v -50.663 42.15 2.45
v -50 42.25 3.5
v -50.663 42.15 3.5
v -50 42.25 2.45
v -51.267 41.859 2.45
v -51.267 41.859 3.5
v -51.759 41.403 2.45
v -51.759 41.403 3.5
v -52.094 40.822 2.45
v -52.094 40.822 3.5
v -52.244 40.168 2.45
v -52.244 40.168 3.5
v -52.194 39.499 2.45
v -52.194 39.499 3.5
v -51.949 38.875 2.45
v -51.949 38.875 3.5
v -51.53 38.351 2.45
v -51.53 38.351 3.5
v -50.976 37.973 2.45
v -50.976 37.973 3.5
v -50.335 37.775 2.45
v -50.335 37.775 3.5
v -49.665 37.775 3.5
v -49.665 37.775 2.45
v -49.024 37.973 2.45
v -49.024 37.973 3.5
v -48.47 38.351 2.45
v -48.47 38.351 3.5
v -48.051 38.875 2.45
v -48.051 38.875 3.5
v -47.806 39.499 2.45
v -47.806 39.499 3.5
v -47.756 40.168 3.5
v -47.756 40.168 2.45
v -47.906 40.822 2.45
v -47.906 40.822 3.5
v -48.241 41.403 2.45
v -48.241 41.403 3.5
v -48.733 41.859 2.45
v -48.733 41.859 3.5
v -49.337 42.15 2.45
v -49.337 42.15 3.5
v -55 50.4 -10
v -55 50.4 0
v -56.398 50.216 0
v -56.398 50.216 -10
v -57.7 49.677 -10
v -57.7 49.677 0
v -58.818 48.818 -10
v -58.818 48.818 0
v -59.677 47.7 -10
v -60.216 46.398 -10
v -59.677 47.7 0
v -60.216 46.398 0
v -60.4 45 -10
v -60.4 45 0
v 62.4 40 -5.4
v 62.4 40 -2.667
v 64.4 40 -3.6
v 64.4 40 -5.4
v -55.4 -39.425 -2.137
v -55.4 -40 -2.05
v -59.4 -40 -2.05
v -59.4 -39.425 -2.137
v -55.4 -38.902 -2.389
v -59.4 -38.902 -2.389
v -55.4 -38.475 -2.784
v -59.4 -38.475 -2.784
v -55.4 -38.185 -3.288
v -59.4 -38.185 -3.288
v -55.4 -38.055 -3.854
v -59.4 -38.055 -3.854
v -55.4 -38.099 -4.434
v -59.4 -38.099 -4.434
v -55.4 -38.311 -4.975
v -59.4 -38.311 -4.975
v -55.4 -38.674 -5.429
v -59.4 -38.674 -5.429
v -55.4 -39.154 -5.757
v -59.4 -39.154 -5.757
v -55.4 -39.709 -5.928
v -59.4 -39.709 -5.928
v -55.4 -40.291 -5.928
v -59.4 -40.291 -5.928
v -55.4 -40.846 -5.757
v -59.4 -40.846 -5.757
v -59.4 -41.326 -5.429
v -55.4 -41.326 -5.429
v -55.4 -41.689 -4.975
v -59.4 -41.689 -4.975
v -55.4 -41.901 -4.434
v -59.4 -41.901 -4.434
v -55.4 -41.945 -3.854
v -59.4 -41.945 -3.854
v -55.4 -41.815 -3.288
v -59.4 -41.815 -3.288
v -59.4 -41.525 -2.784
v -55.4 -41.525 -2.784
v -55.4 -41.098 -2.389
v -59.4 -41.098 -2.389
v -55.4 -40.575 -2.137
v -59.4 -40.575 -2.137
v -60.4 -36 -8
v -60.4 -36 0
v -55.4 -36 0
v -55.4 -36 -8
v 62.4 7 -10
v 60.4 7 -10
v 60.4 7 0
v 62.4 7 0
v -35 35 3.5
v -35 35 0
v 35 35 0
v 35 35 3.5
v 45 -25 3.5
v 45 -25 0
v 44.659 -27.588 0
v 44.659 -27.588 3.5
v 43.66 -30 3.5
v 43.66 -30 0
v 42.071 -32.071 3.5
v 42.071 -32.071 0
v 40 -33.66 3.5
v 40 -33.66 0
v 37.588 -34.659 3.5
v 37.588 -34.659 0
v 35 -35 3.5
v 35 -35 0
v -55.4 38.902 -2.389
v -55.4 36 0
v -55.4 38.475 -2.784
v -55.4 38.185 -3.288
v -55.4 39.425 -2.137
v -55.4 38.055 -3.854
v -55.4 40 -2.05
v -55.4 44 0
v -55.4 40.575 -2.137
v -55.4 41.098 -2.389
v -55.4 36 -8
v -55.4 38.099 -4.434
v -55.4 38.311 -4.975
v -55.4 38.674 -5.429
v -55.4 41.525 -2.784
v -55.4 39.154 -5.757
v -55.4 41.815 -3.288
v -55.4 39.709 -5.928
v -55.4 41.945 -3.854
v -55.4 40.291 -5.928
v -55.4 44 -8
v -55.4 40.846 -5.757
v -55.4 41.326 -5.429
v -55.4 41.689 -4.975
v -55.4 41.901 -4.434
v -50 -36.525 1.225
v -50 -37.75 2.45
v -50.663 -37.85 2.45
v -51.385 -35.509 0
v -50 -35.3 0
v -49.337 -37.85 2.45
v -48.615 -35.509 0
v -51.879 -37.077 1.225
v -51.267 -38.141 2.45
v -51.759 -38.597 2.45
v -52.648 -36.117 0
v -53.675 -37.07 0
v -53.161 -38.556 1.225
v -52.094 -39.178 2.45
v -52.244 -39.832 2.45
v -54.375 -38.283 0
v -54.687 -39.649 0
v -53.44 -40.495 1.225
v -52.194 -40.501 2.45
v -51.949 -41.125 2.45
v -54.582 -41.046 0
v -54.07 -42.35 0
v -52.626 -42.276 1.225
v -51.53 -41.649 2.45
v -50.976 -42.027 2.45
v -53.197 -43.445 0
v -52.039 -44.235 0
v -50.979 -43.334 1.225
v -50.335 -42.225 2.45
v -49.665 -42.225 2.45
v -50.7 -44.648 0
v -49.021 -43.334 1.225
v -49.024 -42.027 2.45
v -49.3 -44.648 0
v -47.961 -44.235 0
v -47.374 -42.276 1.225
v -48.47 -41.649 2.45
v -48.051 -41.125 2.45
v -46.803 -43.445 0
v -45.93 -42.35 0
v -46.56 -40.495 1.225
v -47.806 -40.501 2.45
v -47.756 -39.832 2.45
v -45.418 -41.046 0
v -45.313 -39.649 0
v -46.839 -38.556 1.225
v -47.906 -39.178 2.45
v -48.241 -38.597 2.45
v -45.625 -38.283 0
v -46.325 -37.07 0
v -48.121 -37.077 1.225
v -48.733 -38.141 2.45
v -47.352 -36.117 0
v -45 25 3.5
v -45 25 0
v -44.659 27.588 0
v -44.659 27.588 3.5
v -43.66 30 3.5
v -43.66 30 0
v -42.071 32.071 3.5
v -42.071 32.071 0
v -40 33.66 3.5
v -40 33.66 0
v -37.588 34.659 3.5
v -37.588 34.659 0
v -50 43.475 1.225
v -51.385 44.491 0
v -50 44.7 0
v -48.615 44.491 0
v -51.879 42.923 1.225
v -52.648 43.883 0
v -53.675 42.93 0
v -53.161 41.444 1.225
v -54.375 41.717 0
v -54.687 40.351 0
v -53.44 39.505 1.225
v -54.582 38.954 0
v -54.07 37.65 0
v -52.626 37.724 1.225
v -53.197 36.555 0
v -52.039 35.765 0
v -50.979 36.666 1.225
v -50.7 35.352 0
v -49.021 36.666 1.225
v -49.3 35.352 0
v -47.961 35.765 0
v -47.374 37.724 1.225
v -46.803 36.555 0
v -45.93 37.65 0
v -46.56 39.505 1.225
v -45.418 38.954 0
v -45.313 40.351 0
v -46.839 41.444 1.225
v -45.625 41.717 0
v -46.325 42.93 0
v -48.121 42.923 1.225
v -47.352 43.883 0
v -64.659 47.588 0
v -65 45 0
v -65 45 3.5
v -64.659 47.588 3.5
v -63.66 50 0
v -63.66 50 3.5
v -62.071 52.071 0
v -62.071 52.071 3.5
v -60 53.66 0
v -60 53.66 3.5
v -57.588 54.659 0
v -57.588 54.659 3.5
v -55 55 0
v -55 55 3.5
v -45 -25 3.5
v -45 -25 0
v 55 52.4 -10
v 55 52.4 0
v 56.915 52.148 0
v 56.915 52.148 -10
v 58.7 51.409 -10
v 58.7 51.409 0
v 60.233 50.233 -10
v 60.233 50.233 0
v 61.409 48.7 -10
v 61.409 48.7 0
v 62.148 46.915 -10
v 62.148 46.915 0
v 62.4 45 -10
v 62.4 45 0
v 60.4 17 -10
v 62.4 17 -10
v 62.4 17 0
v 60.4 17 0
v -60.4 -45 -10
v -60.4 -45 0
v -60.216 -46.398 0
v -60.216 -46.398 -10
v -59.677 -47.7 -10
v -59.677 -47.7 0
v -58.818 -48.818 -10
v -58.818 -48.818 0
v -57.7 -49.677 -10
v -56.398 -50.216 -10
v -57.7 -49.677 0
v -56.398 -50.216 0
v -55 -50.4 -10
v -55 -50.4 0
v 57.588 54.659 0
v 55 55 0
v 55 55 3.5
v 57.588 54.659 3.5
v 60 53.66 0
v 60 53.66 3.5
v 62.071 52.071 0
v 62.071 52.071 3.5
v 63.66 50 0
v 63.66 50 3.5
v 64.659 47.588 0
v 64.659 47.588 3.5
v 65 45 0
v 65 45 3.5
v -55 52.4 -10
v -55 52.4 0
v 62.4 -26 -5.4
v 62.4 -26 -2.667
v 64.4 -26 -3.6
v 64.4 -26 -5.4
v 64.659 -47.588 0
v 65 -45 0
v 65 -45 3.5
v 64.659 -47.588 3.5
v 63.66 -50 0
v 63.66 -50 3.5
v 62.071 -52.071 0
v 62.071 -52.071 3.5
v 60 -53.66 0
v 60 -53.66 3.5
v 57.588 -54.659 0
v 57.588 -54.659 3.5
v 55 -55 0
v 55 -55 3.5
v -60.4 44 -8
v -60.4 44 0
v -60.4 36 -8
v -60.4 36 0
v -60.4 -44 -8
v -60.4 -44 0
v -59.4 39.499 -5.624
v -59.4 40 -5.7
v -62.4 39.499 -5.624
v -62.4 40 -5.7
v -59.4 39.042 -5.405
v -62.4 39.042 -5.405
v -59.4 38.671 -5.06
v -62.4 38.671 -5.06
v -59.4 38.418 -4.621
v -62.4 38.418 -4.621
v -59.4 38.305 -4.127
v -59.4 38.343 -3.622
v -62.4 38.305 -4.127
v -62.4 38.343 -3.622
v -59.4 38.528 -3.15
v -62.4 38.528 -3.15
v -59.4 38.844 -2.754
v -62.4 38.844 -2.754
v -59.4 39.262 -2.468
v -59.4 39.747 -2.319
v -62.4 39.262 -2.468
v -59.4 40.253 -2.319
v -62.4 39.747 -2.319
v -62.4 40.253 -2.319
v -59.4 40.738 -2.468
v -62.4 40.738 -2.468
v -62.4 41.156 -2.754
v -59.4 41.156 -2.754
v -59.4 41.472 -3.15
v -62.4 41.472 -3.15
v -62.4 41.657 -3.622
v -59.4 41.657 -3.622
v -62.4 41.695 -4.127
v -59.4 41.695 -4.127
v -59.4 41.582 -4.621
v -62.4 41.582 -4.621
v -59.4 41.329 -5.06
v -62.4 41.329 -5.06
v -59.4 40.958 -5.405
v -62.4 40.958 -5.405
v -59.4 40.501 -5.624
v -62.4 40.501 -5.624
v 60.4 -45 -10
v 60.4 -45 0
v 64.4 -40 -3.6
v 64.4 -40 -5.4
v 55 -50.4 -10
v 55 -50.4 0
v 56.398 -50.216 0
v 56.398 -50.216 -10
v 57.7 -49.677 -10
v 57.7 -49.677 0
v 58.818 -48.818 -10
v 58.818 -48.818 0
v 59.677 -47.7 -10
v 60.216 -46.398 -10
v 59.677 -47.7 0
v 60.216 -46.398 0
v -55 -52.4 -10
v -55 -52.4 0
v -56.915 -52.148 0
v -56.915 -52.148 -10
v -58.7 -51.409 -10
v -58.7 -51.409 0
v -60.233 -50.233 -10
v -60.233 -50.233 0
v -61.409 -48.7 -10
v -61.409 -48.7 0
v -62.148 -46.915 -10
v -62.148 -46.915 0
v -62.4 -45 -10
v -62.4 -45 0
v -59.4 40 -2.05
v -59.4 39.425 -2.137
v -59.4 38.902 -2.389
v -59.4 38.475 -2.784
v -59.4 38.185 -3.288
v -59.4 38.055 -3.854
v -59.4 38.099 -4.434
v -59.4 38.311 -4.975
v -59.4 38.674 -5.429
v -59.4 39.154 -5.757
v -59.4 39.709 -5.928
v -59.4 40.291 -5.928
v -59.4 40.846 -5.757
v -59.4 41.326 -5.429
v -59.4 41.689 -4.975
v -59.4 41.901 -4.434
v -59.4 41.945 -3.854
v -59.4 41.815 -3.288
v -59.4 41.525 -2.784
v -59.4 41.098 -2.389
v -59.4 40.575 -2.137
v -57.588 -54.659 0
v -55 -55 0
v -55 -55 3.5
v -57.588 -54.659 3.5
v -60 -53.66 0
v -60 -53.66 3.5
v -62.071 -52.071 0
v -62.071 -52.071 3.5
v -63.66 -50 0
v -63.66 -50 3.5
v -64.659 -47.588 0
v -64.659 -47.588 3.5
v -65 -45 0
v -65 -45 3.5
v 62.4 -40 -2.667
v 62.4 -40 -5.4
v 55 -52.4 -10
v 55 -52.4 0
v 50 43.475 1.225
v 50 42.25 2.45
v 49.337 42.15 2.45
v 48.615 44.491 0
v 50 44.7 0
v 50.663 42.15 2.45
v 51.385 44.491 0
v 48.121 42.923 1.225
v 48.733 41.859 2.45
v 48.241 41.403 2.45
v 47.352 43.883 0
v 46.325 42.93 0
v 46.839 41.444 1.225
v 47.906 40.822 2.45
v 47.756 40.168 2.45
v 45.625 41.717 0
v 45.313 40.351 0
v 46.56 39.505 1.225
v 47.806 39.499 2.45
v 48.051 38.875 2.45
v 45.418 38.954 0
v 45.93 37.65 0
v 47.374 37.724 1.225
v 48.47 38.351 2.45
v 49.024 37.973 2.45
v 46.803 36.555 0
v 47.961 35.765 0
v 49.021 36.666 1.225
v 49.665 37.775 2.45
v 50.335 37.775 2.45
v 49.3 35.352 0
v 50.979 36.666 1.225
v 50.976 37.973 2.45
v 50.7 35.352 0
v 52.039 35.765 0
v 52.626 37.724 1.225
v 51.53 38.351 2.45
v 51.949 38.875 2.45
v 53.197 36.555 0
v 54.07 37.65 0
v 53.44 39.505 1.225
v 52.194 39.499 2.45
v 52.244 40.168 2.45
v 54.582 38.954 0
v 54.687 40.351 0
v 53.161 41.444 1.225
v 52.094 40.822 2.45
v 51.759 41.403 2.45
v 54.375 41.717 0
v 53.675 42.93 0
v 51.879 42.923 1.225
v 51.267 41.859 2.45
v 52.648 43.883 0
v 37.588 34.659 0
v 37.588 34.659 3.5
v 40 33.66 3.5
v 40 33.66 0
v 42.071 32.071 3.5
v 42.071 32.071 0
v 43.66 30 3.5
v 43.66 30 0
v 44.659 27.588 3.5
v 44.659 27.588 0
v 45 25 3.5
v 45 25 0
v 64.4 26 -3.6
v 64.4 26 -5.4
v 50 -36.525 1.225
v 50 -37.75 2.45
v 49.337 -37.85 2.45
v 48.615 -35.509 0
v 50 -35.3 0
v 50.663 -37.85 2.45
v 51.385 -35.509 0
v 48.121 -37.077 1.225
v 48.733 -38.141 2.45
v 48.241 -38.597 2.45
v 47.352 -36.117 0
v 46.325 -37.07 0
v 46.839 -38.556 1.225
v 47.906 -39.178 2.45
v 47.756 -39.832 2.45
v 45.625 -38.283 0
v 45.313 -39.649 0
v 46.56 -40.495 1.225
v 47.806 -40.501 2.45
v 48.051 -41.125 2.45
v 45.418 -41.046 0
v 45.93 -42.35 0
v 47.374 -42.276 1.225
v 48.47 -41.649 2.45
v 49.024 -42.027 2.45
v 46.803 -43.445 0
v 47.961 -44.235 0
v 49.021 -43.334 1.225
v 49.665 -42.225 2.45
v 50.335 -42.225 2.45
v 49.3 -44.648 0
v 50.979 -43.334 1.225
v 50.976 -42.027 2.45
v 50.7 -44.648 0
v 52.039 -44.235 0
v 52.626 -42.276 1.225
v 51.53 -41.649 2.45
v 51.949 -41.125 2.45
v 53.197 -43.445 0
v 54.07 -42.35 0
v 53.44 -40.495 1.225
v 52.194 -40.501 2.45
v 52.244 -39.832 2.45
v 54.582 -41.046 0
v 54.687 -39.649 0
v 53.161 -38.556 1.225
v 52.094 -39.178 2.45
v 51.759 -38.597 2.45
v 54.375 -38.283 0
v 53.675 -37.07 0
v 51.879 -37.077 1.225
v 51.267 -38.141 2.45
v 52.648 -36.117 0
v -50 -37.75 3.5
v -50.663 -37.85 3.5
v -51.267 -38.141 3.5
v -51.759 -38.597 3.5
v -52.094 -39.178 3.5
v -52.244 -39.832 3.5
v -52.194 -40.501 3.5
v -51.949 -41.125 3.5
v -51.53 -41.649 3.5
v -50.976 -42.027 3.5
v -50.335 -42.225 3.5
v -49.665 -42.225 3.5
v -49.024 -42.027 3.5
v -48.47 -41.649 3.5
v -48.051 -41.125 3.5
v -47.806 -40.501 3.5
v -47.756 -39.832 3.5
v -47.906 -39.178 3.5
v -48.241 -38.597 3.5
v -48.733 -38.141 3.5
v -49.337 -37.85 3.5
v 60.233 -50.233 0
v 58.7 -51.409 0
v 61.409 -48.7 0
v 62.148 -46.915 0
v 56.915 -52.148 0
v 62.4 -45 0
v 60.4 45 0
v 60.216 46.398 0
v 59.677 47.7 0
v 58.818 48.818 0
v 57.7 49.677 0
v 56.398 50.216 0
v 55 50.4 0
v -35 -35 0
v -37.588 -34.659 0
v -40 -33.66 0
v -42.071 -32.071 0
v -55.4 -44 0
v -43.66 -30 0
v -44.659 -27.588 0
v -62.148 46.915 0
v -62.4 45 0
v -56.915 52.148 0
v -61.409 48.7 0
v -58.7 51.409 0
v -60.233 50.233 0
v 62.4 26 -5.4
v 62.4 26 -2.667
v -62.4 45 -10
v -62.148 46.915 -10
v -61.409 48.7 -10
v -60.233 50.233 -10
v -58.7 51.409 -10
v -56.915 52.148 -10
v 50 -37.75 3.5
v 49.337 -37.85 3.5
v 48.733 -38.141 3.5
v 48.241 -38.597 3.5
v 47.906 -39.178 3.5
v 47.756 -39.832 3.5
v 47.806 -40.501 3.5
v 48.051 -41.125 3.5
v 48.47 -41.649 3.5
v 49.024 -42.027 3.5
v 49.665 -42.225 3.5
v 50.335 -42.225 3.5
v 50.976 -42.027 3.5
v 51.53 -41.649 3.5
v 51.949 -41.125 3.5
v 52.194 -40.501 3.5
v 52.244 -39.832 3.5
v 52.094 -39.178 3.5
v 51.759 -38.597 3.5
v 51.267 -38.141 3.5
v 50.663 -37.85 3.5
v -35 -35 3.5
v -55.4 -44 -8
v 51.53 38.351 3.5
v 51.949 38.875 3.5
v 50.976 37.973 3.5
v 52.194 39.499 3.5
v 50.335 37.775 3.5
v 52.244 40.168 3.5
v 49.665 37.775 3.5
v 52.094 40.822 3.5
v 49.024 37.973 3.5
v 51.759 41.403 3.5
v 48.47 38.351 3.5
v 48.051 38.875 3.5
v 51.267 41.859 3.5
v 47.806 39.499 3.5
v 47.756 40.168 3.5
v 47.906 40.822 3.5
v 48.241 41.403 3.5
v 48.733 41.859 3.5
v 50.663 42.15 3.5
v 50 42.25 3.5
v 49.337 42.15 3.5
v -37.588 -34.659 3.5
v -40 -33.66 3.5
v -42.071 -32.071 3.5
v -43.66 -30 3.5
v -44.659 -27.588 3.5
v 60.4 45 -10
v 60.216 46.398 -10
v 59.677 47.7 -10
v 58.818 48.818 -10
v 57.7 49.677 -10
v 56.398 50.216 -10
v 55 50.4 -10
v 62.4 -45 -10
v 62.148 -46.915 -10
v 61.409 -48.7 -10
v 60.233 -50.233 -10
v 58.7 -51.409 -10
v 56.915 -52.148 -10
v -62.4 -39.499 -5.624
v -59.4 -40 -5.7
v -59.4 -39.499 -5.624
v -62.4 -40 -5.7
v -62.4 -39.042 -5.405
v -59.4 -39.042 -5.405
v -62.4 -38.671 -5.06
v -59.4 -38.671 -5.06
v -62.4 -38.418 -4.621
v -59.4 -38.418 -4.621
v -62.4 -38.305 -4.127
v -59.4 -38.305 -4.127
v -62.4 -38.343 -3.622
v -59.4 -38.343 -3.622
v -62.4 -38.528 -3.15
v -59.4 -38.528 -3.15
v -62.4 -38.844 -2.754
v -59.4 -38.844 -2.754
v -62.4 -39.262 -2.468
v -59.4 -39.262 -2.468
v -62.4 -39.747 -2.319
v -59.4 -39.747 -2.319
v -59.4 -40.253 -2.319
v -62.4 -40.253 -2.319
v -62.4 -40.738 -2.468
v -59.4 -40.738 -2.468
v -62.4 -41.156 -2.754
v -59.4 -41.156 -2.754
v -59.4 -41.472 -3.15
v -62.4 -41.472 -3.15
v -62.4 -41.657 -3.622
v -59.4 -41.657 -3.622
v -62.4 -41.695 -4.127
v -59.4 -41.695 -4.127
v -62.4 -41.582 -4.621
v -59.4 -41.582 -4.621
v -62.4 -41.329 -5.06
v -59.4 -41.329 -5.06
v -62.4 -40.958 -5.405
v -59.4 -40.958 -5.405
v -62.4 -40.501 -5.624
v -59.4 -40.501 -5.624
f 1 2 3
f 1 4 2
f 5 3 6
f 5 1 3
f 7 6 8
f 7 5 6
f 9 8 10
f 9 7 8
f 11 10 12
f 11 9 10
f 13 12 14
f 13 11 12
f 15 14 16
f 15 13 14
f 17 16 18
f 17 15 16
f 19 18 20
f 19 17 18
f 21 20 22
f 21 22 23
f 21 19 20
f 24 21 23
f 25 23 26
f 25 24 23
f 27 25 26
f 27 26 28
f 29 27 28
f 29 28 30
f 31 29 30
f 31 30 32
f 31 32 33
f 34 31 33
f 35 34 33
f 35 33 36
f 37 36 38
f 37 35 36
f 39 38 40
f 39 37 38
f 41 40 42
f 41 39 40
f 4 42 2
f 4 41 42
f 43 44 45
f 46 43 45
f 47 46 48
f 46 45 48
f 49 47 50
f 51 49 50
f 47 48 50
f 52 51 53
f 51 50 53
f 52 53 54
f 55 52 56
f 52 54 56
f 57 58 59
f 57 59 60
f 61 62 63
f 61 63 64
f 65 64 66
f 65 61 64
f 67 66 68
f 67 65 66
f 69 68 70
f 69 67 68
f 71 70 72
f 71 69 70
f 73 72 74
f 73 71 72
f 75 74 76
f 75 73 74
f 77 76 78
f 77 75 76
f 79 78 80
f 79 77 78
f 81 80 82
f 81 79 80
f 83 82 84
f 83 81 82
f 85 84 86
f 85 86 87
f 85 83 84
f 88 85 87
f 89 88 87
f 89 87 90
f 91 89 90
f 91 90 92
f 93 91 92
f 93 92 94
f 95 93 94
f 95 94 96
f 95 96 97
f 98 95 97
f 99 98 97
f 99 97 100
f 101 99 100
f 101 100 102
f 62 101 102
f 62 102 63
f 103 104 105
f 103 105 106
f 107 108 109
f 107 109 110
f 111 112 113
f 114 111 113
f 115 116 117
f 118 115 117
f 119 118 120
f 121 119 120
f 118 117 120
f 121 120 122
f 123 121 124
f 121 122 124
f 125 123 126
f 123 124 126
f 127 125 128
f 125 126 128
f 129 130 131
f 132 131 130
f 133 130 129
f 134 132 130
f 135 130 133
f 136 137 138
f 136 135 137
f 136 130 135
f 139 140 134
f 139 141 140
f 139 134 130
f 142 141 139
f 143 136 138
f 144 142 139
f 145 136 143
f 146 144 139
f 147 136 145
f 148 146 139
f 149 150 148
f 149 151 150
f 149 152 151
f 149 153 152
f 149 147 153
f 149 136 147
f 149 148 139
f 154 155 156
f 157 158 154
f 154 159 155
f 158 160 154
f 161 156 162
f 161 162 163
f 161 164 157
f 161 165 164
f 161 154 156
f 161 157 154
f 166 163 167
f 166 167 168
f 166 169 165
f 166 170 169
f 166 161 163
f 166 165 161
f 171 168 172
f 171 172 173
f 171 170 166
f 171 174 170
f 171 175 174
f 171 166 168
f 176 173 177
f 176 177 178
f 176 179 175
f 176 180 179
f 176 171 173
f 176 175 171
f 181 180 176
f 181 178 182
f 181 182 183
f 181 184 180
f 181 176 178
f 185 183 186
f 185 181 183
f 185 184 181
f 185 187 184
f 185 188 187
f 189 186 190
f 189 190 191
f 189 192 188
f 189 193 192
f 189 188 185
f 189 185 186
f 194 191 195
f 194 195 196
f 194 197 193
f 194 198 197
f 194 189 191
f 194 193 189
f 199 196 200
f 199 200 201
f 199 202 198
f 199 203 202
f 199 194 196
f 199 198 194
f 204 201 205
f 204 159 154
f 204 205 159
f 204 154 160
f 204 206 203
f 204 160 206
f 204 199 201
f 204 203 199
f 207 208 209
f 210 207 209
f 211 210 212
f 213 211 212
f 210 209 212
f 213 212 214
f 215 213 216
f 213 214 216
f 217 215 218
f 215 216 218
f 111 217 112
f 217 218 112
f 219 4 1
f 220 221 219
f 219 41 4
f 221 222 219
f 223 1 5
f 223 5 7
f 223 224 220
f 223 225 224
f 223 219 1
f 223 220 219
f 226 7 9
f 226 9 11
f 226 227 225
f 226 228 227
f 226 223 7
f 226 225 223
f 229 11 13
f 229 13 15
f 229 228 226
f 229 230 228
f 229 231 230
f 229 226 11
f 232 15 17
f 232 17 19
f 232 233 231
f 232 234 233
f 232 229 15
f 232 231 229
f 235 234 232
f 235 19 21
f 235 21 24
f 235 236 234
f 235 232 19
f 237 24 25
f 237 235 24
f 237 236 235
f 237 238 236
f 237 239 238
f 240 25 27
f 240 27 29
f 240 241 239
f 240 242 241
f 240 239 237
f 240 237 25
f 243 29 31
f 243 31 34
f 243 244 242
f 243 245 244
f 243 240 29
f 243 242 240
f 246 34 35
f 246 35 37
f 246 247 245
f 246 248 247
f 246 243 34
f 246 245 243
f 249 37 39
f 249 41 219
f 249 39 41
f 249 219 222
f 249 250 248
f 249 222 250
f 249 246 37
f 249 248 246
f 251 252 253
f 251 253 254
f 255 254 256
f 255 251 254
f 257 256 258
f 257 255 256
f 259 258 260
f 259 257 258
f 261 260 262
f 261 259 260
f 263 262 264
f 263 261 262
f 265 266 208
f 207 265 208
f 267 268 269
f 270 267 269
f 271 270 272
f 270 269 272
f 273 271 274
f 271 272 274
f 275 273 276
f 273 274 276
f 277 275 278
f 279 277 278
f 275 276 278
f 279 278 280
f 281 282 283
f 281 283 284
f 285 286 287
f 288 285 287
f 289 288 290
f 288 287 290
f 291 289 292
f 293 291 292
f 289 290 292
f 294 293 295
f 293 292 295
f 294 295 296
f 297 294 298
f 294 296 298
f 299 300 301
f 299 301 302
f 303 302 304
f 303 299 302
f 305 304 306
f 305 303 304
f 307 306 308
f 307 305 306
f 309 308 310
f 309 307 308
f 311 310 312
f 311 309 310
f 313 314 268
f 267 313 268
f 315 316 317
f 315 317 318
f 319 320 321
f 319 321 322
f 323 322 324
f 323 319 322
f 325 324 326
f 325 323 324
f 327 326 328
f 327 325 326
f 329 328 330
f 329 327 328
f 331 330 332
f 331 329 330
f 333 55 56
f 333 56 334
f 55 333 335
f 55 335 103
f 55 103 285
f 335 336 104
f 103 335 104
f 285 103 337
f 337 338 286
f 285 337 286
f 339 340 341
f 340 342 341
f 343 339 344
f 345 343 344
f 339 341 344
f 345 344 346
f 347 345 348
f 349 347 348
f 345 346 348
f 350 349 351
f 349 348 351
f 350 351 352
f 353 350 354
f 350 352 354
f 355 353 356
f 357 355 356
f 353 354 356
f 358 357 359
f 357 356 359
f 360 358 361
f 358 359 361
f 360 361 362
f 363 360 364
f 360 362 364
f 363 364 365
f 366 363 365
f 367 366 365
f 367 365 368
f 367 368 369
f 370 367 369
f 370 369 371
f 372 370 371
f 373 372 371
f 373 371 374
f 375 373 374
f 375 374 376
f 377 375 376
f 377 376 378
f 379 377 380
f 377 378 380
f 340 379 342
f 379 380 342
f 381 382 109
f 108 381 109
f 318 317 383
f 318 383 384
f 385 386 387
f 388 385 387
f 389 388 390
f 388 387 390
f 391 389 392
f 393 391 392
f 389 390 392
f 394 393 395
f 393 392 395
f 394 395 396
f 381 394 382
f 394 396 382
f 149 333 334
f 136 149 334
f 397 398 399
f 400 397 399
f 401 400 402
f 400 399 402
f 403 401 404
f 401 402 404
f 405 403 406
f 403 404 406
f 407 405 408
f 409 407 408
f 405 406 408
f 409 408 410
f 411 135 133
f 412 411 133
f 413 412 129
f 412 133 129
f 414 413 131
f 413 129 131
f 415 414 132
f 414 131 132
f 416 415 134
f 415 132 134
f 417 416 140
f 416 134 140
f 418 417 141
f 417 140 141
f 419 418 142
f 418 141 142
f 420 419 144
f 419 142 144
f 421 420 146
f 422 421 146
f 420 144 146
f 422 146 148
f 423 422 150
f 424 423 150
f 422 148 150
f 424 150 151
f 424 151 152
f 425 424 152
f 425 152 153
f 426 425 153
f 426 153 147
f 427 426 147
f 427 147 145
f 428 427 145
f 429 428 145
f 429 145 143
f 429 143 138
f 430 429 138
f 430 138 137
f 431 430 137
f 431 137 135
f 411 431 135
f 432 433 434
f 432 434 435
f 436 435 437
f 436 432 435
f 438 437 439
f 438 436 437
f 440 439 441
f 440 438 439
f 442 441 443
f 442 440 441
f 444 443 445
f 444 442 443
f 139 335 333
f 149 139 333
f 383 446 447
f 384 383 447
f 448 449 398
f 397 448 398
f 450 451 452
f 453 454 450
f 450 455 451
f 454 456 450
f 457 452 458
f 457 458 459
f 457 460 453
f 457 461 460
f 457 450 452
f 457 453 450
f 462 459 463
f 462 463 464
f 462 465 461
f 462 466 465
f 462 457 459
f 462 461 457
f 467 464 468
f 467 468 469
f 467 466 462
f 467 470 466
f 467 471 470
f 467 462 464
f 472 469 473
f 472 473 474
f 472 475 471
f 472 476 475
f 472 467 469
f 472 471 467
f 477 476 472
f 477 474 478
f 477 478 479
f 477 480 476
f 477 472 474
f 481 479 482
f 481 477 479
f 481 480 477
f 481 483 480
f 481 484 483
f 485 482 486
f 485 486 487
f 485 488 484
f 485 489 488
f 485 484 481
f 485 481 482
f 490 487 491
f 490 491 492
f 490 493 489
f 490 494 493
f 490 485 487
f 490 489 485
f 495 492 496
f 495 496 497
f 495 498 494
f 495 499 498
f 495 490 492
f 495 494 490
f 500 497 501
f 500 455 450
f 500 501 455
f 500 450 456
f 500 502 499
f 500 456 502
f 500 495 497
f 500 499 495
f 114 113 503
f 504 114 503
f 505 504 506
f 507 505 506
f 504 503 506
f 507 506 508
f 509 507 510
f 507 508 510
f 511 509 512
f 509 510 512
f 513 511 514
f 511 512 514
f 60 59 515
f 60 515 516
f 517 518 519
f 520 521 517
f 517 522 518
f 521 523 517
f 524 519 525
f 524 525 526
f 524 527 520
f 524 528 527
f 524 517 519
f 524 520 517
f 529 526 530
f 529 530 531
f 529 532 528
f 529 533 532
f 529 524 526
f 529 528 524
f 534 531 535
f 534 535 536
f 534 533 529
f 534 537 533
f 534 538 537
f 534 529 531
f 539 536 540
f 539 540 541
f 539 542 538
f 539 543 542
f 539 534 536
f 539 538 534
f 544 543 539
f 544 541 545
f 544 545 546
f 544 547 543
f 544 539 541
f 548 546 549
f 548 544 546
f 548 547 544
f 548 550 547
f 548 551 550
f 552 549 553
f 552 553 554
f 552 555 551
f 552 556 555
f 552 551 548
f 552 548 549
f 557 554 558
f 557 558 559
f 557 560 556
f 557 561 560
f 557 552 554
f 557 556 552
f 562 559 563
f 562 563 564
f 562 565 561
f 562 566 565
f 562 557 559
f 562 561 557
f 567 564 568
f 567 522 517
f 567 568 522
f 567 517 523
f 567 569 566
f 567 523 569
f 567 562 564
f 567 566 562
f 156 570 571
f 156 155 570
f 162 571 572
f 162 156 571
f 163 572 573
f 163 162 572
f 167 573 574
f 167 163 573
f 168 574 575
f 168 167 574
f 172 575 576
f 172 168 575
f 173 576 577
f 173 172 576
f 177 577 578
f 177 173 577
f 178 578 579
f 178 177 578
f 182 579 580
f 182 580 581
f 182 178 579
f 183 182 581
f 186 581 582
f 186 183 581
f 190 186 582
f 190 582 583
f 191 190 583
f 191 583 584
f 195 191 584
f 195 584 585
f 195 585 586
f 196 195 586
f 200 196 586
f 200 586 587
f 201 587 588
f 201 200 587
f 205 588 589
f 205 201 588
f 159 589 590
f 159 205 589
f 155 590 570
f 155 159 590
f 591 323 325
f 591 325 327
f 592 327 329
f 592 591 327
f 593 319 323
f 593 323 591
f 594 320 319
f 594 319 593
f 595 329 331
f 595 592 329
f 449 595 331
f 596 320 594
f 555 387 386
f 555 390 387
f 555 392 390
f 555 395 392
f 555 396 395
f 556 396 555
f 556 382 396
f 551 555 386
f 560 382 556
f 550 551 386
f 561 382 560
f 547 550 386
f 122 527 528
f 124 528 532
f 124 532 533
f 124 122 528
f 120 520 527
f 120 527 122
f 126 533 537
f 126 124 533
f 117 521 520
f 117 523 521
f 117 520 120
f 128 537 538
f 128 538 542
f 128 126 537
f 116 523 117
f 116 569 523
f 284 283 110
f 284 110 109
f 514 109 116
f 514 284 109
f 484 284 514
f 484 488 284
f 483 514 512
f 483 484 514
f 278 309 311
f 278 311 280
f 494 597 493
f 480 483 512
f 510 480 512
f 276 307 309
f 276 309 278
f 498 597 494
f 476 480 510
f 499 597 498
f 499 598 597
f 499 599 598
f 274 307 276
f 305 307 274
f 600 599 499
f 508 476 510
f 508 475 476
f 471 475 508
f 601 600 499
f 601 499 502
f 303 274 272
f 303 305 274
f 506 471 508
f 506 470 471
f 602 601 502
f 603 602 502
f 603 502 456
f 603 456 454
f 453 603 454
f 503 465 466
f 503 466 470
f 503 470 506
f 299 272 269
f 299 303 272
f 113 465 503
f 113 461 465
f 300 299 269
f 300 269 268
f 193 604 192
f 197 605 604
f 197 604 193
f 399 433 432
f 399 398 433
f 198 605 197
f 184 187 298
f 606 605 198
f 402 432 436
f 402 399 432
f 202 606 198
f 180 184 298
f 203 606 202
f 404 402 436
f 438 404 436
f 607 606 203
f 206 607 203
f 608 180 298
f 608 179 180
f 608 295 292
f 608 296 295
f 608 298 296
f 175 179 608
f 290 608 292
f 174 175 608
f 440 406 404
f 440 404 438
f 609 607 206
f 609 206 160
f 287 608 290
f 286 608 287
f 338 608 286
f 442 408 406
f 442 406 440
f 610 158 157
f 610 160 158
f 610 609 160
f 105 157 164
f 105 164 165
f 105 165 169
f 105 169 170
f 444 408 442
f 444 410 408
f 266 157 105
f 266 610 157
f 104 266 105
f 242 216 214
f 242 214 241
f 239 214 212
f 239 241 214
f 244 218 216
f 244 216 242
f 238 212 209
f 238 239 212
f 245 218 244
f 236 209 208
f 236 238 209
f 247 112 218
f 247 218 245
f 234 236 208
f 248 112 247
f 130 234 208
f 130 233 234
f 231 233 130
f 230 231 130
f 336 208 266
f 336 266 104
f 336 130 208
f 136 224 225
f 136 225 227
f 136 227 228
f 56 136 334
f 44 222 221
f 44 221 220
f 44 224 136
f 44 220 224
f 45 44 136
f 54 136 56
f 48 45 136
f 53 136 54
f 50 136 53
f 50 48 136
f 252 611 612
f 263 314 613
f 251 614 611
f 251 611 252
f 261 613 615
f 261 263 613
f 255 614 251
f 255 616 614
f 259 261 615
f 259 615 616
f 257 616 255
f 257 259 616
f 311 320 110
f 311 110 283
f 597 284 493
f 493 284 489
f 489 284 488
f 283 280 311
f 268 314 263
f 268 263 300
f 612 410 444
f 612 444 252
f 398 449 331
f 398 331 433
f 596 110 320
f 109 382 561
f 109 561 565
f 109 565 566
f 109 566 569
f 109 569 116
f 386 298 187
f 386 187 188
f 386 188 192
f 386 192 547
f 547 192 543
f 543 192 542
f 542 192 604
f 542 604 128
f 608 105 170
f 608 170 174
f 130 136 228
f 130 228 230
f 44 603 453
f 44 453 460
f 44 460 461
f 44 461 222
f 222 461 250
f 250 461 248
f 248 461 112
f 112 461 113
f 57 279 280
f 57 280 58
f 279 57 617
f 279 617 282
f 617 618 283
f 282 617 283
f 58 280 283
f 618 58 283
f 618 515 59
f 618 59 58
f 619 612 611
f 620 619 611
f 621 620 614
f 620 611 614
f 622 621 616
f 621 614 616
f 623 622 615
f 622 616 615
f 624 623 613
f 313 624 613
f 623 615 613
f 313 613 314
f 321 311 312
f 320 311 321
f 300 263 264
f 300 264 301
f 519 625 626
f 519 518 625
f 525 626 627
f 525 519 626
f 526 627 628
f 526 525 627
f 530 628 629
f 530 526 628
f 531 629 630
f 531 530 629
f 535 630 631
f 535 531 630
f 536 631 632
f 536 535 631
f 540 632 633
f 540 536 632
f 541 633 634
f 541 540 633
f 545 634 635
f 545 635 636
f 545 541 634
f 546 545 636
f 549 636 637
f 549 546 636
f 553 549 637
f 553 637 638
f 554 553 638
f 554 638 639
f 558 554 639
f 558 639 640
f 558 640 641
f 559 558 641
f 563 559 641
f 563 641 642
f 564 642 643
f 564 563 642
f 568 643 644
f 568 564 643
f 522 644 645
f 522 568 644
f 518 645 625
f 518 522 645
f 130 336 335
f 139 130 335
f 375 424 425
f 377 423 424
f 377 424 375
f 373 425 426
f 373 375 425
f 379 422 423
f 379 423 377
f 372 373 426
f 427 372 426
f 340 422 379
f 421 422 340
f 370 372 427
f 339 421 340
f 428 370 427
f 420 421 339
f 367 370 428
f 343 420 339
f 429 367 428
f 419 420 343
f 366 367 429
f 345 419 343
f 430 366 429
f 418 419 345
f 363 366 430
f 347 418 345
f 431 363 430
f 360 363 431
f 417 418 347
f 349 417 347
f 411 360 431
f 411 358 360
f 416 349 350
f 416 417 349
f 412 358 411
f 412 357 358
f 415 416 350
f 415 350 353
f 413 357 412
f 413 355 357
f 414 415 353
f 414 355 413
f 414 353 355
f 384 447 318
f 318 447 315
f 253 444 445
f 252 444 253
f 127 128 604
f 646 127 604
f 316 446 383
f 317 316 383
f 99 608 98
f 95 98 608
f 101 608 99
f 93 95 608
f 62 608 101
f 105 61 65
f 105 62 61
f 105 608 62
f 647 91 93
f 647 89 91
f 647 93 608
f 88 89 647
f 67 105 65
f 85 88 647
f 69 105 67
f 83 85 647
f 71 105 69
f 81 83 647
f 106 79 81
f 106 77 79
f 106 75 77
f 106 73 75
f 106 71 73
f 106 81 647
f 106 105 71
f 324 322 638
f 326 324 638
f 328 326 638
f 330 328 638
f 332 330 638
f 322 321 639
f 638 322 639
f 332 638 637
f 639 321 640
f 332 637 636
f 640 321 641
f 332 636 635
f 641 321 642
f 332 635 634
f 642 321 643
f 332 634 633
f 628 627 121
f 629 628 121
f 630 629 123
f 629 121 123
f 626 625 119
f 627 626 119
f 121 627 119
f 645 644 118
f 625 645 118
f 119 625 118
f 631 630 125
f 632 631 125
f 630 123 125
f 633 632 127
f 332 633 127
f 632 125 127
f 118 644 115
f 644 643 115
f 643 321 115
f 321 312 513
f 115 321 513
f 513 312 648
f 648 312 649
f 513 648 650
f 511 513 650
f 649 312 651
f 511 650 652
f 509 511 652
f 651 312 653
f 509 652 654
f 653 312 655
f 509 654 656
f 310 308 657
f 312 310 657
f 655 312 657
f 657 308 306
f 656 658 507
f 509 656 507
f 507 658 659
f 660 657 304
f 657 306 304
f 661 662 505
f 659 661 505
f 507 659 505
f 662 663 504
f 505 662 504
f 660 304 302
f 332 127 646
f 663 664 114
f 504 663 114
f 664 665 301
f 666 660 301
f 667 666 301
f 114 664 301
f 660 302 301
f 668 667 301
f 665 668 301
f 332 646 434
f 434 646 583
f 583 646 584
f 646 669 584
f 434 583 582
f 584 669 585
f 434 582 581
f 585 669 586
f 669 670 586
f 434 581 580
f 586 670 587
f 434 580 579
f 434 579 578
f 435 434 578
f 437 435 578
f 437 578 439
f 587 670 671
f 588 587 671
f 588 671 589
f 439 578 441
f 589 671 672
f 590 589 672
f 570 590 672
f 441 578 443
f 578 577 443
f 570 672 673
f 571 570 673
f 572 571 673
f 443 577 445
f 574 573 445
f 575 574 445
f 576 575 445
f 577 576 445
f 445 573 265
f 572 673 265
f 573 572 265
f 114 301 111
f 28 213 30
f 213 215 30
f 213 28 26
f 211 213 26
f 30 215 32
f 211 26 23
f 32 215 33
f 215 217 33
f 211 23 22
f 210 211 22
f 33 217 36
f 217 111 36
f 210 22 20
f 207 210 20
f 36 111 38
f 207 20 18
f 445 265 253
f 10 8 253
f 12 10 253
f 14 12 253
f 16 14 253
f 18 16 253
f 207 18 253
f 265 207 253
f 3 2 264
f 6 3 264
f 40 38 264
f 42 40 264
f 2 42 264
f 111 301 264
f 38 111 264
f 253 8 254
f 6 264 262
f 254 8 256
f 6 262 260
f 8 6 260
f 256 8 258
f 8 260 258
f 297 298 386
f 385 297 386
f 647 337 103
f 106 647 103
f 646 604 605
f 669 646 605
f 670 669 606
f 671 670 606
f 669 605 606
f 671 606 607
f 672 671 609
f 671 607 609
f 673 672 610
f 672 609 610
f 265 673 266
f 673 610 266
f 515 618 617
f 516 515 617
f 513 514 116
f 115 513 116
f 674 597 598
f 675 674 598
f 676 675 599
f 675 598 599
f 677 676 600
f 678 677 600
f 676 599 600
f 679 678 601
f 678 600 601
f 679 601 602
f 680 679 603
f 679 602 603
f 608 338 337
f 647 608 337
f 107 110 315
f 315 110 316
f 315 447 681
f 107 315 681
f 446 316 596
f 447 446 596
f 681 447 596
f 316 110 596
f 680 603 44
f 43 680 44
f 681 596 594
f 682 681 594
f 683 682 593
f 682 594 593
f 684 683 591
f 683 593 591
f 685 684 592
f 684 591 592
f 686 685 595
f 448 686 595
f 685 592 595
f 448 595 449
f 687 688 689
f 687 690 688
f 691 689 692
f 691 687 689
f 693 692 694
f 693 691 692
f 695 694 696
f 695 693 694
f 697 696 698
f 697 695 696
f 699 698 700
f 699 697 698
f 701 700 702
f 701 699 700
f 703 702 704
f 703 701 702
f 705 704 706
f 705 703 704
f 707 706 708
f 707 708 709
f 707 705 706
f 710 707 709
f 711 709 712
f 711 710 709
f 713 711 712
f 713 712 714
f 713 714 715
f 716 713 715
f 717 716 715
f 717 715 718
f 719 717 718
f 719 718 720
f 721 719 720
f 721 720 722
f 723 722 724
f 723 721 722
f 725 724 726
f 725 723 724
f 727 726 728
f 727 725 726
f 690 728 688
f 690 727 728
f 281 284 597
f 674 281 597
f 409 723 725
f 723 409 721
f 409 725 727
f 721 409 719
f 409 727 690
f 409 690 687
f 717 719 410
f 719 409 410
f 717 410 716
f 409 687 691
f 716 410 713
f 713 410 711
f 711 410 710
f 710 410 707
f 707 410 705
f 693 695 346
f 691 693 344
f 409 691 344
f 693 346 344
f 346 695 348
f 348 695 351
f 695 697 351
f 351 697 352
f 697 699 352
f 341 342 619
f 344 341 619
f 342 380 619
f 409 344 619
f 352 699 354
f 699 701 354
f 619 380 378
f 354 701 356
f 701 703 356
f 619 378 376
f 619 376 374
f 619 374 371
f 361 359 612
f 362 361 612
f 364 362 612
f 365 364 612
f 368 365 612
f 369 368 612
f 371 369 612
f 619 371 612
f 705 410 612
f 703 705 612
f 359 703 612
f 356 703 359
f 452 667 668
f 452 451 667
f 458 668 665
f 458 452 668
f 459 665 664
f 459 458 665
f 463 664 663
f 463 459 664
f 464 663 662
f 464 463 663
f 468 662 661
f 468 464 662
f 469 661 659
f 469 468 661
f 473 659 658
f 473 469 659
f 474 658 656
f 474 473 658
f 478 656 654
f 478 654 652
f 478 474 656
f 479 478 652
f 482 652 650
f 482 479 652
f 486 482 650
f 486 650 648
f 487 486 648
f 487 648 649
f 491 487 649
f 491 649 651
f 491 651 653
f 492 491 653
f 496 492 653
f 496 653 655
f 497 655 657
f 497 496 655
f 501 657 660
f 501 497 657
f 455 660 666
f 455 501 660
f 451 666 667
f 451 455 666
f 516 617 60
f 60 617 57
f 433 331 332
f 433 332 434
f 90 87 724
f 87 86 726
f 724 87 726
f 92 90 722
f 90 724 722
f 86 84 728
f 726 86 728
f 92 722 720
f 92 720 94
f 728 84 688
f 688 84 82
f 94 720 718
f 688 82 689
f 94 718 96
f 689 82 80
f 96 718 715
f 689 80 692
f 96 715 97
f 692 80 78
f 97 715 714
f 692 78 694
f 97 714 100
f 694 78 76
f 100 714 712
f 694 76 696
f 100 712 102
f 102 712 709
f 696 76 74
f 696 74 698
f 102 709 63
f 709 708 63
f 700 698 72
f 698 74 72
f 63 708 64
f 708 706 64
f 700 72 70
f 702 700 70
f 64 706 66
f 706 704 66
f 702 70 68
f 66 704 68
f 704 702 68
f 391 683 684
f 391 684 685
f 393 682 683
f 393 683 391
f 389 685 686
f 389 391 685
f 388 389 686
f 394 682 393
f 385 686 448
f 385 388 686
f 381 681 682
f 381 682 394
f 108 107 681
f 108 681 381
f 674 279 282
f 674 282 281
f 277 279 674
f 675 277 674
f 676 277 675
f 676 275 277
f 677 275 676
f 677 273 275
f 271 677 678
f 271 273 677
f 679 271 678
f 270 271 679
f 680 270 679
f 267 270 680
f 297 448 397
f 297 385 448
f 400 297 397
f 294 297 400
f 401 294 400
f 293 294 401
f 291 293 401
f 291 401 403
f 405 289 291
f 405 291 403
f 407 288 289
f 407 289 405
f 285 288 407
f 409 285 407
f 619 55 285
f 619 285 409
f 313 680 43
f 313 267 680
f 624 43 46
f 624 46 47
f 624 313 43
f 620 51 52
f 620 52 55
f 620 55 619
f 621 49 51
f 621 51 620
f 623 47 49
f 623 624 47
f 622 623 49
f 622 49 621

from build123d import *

# Parameters (mm, degrees)
P_IDAT_VYSUNUT_M2_DEPTH                           = 3.5
P_IDAT_VYSUNUT_M3_DEPTH                           = 10
V_LCOV_ZAHLOUBEN_PRO_M4_ROUBY_S_P_2_COUNT         = 2
V_LCOV_ZAHLOUBEN_PRO_M4_ROUBY_S_P_2_PITCH         = 100
V_LCOV_ZAHLOUBEN_PRO_M4_ROUBY_S_P_3_COUNT         = 2
V_LCOV_ZAHLOUBEN_PRO_M4_ROUBY_S_P_3_PITCH         = 128.062484749
V_LCOV_ZAHLOUBEN_PRO_M4_ROUBY_S_P_4_COUNT         = 2
V_LCOV_ZAHLOUBEN_PRO_M4_ROUBY_S_P_4_PITCH         = 80
ODEBRAT_VYSUNUT_M2_DEPTH                          = 86.732140997
SKICA8_W                                          = 5
SKICA8_H                                          = 8
SKICA8_W_2                                        = 3
SKICA8_W_3                                        = 8
P_IDAT_VYSUNUT_M4_DEPTH                           = 5
V_LCOV_ZAHLOUBEN_PRO_M3_ROUBY_S_V_LCO_D           = 3.4
V_LCOV_ZAHLOUBEN_PRO_M3_ROUBY_S_V_LCO_DEPTH       = 9.6
V_LCOV_ZAHLOUBEN_PRO_M3_ROUBY_S_V_LCO_CBORE_D     = 3.9
V_LCOV_ZAHLOUBEN_PRO_M3_ROUBY_S_V_LCO_CBORE_DEPTH = 4
SKICA15_W                                         = 2.8
SKICA15_H                                         = 14
P_IDAT_VYSUNUT_M5_DEPTH                           = 2
ZKOSEN_1_SIZE                                     = 2.144506921
ZKOSEN_1_SIZE_2                                   = 1
ZKOSEN_2_SIZE                                     = 1
ZKOSEN_2_SIZE_2                                   = 2.144506921


with BuildPart() as part:
    # Skica1 → Přidat vysunutím2 (new body)
    with BuildSketch(Plane.XY):
        with BuildLine():
            Line((-55, 55), (55, 55))
            ThreePointArc((55, 55), (62.071067812, 52.071067812), (65, 45))
            Line((65, 45), (65, -45))
            ThreePointArc((65, -45), (62.071067812, -52.071067812), (55, -55))
            Line((55, -55), (-55, -55))
            ThreePointArc((-55, -55), (-62.071067812, -52.071067812), (-65, -45))
            Line((-65, -45), (-65, 45))
            ThreePointArc((-65, 45), (-62.071067812, 52.071067812), (-55, 55))
        make_face()
    extrude(amount=P_IDAT_VYSUNUT_M2_DEPTH)

    # Skica3 → Přidat vysunutím3 (add)
    with BuildSketch(Plane(origin=(0, 0, 0), x_dir=(-1, 0, 0), z_dir=(0, 0, -1))):
        with BuildLine():
            Line((-60.4, 17), (-60.4, 45))
            ThreePointArc((-60.4, 45), (-58.818376618, 48.818376618), (-55, 50.4))
            Line((-55, 50.4), (55, 50.4))
            ThreePointArc((55, 50.4), (58.818376618, 48.818376618), (60.4, 45))
            Line((60.4, 45), (60.4, -45))
            ThreePointArc((60.4, -45), (58.818376618, -48.818376618), (55, -50.4))
            Line((55, -50.4), (-55, -50.4))
            ThreePointArc((-55, -50.4), (-58.818376618, -48.818376618), (-60.4, -45))
            Line((-60.4, -45), (-60.4, 7))
            Line((-60.4, 7), (-62.4, 7))
            Line((-62.4, 7), (-62.4, -45))
            ThreePointArc((-62.4, -45), (-60.232590181, -50.232590181), (-55, -52.4))
            Line((-55, -52.4), (55, -52.4))
            ThreePointArc((55, -52.4), (60.232590181, -50.232590181), (62.4, -45))
            Line((62.4, -45), (62.4, 45))
            ThreePointArc((62.4, 45), (60.232590181, 50.232590181), (55, 52.4))
            Line((55, 52.4), (-55, 52.4))
            ThreePointArc((-55, 52.4), (-60.232590181, 50.232590181), (-62.4, 45))
            Line((-62.4, 45), (-62.4, 17))
            Line((-62.4, 17), (-60.4, 17))
        make_face()
    extrude(amount=P_IDAT_VYSUNUT_M3_DEPTH)

    # Skica5 → Válcové zahloubení pro M4 šrouby s plochou hlavou1 (revolve, cut)
    with BuildSketch(Plane(origin=(-50, -40, 0), x_dir=(0, 1, 0), z_dir=(1, 0, 0))):
        Polygon((0, 0), (0, 3.5), (2.25, 3.5), (2.25, 2.45), (4.7, 0), align=None)
    v_lcov_zahlouben_pro_m4_rouby_s_ploch = revolve(axis=Axis((-50, -40, -6.35), (0, 0, 1)), mode=Mode.SUBTRACT)

    # V_lcov_ zahlouben_ pro M4 _rouby s p 2: Válcové zahloubení pro M4 šrouby s plochou hlavou1 ×2
    with Locations(*[(i * V_LCOV_ZAHLOUBEN_PRO_M4_ROUBY_S_P_2_PITCH, 0, 0) for i in range(1, V_LCOV_ZAHLOUBEN_PRO_M4_ROUBY_S_P_2_COUNT)]):
        add(v_lcov_zahlouben_pro_m4_rouby_s_ploch, mode=Mode.SUBTRACT)

    # V_lcov_ zahlouben_ pro M4 _rouby s p 3: Válcové zahloubení pro M4 šrouby s plochou hlavou1 ×2
    with Locations(*[Vector(0.7808688094430304, 0.6246950475544243, 0) * (i * V_LCOV_ZAHLOUBEN_PRO_M4_ROUBY_S_P_3_PITCH) for i in range(1, V_LCOV_ZAHLOUBEN_PRO_M4_ROUBY_S_P_3_COUNT)]):
        add(v_lcov_zahlouben_pro_m4_rouby_s_ploch, mode=Mode.SUBTRACT)

    # V_lcov_ zahlouben_ pro M4 _rouby s p 4: Válcové zahloubení pro M4 šrouby s plochou hlavou1 ×2
    with Locations(*[(0, i * V_LCOV_ZAHLOUBEN_PRO_M4_ROUBY_S_P_4_PITCH, 0) for i in range(1, V_LCOV_ZAHLOUBEN_PRO_M4_ROUBY_S_P_4_COUNT)]):
        add(v_lcov_zahlouben_pro_m4_rouby_s_ploch, mode=Mode.SUBTRACT)

    # Skica6 → Odebrat vysunutím2 (cut, through all)
    with BuildSketch(Plane(origin=(0, 0, 0), x_dir=(-1, 0, 0), z_dir=(0, 0, -1))):
        with BuildLine():
            Line((-35, -35), (35, -35))
            ThreePointArc((35, -35), (42.071067812, -32.071067812), (45, -25))
            Line((45, -25), (45, 25))
            ThreePointArc((45, 25), (42.071067812, 32.071067812), (35, 35))
            Line((35, 35), (-35, 35))
            ThreePointArc((-35, 35), (-42.071067812, 32.071067812), (-45, 25))
            Line((-45, 25), (-45, -25))
            ThreePointArc((-45, -25), (-42.071067812, -32.071067812), (-35, -35))
        make_face()
    extrude(amount=-ODEBRAT_VYSUNUT_M2_DEPTH, mode=Mode.SUBTRACT)

    # Skica8 → Přidat vysunutím4 (add)
    with BuildSketch(Plane(origin=(-60.4, 0, 0), x_dir=(0, 0, -1), z_dir=(1, 0, 0))):
        with Locations((2.5, 40)):
            Rectangle(SKICA8_W, SKICA8_H)
        with Locations((6.5, 40)):
            Rectangle(SKICA8_W_2, SKICA8_H)
        with Locations((4, -40)):
            Rectangle(SKICA8_W_3, SKICA8_H)
    extrude(amount=P_IDAT_VYSUNUT_M4_DEPTH)

    # Válcové zahloubení pro M3 šrouby s válcovou hlavou zaoblenou1
    with Locations(Plane(origin=(-55.4, 40, -4), x_dir=(0, 0, 1), z_dir=(1, 0, 0))):
        with Locations((0, 0)):
            v_lcov_zahlouben_pro_m3_rouby_s_v_lco = CounterBoreHole(V_LCOV_ZAHLOUBEN_PRO_M3_ROUBY_S_V_LCO_D / 2, V_LCOV_ZAHLOUBEN_PRO_M3_ROUBY_S_V_LCO_CBORE_D / 2, V_LCOV_ZAHLOUBEN_PRO_M3_ROUBY_S_V_LCO_CBORE_DEPTH, depth=V_LCOV_ZAHLOUBEN_PRO_M3_ROUBY_S_V_LCO_DEPTH)

    # Zrcadlit1: Válcové zahloubení pro M3 šrouby s válcovou hlavou zaoblenou1 across plane
    add(v_lcov_zahlouben_pro_m3_rouby_s_v_lco.mirror(Plane.ZX), mode=Mode.SUBTRACT)

    # Skica15 → Přidat vysunutím5 (add)
    with BuildSketch(Plane(origin=(62.4, 0, 0), x_dir=(0, 0, -1), z_dir=(1, 0, 0))):
        with Locations((4, 33)):
            Rectangle(SKICA15_W, SKICA15_H)
        with Locations((4, -33)):
            Rectangle(SKICA15_W, SKICA15_H)
    extrude(amount=P_IDAT_VYSUNUT_M5_DEPTH)

    # Zkosení1
    # the kernel refuses this chamfer: 2.144506921, 1 mm, written as the material it takes off along each edge
    with BuildSketch(Plane(origin=(64.4, -45.556364829, -2.6), x_dir=(-0.9998669641130703, 0, 0.016311164131110292), z_dir=(0, 1, 0))) as zkosen_1_piece_1_section:
        Polygon((ZKOSEN_1_SIZE * 0.999866963884, -ZKOSEN_1_SIZE * 0.0163111641274), (-ZKOSEN_1_SIZE_2 * 0.0163111641311, -ZKOSEN_1_SIZE_2 * 0.999866964113), (0, 0), align=None)
    zkosen_1_piece_1 = extrude(amount=25.112729659, mode=Mode.PRIVATE)
    zkosen_1_piece_1 = split(zkosen_1_piece_1, bisect_by=Plane(origin=(62.4, -33, -2.920893851), z_dir=(1, 0, 0)), keep=Keep.TOP, mode=Mode.PRIVATE)
    add(zkosen_1_piece_1, mode=Mode.SUBTRACT)

    # Zkosení2
    # the kernel refuses this chamfer: 2.144506921, 1 mm, written as the material it takes off along each edge
    with BuildSketch(Plane(origin=(64.4, 20.443635171, -2.6), x_dir=(0.07481330637059905, 0, -0.9971975577536776), z_dir=(0, 1, 0))) as zkosen_2_piece_1_section:
        Polygon((ZKOSEN_2_SIZE * 0.997197557754, ZKOSEN_2_SIZE * 0.0748133063706), (-ZKOSEN_2_SIZE_2 * 0.0748133063535, ZKOSEN_2_SIZE_2 * 0.997197557526), (0, 0), align=None)
    zkosen_2_piece_1 = extrude(amount=25.112729659, mode=Mode.PRIVATE)
    zkosen_2_piece_1 = split(zkosen_2_piece_1, bisect_by=Plane(origin=(62.4, 33, -2.920893851), z_dir=(1, 0, 0)), keep=Keep.TOP, mode=Mode.PRIVATE)
    add(zkosen_2_piece_1, mode=Mode.SUBTRACT)


solid = part.part
